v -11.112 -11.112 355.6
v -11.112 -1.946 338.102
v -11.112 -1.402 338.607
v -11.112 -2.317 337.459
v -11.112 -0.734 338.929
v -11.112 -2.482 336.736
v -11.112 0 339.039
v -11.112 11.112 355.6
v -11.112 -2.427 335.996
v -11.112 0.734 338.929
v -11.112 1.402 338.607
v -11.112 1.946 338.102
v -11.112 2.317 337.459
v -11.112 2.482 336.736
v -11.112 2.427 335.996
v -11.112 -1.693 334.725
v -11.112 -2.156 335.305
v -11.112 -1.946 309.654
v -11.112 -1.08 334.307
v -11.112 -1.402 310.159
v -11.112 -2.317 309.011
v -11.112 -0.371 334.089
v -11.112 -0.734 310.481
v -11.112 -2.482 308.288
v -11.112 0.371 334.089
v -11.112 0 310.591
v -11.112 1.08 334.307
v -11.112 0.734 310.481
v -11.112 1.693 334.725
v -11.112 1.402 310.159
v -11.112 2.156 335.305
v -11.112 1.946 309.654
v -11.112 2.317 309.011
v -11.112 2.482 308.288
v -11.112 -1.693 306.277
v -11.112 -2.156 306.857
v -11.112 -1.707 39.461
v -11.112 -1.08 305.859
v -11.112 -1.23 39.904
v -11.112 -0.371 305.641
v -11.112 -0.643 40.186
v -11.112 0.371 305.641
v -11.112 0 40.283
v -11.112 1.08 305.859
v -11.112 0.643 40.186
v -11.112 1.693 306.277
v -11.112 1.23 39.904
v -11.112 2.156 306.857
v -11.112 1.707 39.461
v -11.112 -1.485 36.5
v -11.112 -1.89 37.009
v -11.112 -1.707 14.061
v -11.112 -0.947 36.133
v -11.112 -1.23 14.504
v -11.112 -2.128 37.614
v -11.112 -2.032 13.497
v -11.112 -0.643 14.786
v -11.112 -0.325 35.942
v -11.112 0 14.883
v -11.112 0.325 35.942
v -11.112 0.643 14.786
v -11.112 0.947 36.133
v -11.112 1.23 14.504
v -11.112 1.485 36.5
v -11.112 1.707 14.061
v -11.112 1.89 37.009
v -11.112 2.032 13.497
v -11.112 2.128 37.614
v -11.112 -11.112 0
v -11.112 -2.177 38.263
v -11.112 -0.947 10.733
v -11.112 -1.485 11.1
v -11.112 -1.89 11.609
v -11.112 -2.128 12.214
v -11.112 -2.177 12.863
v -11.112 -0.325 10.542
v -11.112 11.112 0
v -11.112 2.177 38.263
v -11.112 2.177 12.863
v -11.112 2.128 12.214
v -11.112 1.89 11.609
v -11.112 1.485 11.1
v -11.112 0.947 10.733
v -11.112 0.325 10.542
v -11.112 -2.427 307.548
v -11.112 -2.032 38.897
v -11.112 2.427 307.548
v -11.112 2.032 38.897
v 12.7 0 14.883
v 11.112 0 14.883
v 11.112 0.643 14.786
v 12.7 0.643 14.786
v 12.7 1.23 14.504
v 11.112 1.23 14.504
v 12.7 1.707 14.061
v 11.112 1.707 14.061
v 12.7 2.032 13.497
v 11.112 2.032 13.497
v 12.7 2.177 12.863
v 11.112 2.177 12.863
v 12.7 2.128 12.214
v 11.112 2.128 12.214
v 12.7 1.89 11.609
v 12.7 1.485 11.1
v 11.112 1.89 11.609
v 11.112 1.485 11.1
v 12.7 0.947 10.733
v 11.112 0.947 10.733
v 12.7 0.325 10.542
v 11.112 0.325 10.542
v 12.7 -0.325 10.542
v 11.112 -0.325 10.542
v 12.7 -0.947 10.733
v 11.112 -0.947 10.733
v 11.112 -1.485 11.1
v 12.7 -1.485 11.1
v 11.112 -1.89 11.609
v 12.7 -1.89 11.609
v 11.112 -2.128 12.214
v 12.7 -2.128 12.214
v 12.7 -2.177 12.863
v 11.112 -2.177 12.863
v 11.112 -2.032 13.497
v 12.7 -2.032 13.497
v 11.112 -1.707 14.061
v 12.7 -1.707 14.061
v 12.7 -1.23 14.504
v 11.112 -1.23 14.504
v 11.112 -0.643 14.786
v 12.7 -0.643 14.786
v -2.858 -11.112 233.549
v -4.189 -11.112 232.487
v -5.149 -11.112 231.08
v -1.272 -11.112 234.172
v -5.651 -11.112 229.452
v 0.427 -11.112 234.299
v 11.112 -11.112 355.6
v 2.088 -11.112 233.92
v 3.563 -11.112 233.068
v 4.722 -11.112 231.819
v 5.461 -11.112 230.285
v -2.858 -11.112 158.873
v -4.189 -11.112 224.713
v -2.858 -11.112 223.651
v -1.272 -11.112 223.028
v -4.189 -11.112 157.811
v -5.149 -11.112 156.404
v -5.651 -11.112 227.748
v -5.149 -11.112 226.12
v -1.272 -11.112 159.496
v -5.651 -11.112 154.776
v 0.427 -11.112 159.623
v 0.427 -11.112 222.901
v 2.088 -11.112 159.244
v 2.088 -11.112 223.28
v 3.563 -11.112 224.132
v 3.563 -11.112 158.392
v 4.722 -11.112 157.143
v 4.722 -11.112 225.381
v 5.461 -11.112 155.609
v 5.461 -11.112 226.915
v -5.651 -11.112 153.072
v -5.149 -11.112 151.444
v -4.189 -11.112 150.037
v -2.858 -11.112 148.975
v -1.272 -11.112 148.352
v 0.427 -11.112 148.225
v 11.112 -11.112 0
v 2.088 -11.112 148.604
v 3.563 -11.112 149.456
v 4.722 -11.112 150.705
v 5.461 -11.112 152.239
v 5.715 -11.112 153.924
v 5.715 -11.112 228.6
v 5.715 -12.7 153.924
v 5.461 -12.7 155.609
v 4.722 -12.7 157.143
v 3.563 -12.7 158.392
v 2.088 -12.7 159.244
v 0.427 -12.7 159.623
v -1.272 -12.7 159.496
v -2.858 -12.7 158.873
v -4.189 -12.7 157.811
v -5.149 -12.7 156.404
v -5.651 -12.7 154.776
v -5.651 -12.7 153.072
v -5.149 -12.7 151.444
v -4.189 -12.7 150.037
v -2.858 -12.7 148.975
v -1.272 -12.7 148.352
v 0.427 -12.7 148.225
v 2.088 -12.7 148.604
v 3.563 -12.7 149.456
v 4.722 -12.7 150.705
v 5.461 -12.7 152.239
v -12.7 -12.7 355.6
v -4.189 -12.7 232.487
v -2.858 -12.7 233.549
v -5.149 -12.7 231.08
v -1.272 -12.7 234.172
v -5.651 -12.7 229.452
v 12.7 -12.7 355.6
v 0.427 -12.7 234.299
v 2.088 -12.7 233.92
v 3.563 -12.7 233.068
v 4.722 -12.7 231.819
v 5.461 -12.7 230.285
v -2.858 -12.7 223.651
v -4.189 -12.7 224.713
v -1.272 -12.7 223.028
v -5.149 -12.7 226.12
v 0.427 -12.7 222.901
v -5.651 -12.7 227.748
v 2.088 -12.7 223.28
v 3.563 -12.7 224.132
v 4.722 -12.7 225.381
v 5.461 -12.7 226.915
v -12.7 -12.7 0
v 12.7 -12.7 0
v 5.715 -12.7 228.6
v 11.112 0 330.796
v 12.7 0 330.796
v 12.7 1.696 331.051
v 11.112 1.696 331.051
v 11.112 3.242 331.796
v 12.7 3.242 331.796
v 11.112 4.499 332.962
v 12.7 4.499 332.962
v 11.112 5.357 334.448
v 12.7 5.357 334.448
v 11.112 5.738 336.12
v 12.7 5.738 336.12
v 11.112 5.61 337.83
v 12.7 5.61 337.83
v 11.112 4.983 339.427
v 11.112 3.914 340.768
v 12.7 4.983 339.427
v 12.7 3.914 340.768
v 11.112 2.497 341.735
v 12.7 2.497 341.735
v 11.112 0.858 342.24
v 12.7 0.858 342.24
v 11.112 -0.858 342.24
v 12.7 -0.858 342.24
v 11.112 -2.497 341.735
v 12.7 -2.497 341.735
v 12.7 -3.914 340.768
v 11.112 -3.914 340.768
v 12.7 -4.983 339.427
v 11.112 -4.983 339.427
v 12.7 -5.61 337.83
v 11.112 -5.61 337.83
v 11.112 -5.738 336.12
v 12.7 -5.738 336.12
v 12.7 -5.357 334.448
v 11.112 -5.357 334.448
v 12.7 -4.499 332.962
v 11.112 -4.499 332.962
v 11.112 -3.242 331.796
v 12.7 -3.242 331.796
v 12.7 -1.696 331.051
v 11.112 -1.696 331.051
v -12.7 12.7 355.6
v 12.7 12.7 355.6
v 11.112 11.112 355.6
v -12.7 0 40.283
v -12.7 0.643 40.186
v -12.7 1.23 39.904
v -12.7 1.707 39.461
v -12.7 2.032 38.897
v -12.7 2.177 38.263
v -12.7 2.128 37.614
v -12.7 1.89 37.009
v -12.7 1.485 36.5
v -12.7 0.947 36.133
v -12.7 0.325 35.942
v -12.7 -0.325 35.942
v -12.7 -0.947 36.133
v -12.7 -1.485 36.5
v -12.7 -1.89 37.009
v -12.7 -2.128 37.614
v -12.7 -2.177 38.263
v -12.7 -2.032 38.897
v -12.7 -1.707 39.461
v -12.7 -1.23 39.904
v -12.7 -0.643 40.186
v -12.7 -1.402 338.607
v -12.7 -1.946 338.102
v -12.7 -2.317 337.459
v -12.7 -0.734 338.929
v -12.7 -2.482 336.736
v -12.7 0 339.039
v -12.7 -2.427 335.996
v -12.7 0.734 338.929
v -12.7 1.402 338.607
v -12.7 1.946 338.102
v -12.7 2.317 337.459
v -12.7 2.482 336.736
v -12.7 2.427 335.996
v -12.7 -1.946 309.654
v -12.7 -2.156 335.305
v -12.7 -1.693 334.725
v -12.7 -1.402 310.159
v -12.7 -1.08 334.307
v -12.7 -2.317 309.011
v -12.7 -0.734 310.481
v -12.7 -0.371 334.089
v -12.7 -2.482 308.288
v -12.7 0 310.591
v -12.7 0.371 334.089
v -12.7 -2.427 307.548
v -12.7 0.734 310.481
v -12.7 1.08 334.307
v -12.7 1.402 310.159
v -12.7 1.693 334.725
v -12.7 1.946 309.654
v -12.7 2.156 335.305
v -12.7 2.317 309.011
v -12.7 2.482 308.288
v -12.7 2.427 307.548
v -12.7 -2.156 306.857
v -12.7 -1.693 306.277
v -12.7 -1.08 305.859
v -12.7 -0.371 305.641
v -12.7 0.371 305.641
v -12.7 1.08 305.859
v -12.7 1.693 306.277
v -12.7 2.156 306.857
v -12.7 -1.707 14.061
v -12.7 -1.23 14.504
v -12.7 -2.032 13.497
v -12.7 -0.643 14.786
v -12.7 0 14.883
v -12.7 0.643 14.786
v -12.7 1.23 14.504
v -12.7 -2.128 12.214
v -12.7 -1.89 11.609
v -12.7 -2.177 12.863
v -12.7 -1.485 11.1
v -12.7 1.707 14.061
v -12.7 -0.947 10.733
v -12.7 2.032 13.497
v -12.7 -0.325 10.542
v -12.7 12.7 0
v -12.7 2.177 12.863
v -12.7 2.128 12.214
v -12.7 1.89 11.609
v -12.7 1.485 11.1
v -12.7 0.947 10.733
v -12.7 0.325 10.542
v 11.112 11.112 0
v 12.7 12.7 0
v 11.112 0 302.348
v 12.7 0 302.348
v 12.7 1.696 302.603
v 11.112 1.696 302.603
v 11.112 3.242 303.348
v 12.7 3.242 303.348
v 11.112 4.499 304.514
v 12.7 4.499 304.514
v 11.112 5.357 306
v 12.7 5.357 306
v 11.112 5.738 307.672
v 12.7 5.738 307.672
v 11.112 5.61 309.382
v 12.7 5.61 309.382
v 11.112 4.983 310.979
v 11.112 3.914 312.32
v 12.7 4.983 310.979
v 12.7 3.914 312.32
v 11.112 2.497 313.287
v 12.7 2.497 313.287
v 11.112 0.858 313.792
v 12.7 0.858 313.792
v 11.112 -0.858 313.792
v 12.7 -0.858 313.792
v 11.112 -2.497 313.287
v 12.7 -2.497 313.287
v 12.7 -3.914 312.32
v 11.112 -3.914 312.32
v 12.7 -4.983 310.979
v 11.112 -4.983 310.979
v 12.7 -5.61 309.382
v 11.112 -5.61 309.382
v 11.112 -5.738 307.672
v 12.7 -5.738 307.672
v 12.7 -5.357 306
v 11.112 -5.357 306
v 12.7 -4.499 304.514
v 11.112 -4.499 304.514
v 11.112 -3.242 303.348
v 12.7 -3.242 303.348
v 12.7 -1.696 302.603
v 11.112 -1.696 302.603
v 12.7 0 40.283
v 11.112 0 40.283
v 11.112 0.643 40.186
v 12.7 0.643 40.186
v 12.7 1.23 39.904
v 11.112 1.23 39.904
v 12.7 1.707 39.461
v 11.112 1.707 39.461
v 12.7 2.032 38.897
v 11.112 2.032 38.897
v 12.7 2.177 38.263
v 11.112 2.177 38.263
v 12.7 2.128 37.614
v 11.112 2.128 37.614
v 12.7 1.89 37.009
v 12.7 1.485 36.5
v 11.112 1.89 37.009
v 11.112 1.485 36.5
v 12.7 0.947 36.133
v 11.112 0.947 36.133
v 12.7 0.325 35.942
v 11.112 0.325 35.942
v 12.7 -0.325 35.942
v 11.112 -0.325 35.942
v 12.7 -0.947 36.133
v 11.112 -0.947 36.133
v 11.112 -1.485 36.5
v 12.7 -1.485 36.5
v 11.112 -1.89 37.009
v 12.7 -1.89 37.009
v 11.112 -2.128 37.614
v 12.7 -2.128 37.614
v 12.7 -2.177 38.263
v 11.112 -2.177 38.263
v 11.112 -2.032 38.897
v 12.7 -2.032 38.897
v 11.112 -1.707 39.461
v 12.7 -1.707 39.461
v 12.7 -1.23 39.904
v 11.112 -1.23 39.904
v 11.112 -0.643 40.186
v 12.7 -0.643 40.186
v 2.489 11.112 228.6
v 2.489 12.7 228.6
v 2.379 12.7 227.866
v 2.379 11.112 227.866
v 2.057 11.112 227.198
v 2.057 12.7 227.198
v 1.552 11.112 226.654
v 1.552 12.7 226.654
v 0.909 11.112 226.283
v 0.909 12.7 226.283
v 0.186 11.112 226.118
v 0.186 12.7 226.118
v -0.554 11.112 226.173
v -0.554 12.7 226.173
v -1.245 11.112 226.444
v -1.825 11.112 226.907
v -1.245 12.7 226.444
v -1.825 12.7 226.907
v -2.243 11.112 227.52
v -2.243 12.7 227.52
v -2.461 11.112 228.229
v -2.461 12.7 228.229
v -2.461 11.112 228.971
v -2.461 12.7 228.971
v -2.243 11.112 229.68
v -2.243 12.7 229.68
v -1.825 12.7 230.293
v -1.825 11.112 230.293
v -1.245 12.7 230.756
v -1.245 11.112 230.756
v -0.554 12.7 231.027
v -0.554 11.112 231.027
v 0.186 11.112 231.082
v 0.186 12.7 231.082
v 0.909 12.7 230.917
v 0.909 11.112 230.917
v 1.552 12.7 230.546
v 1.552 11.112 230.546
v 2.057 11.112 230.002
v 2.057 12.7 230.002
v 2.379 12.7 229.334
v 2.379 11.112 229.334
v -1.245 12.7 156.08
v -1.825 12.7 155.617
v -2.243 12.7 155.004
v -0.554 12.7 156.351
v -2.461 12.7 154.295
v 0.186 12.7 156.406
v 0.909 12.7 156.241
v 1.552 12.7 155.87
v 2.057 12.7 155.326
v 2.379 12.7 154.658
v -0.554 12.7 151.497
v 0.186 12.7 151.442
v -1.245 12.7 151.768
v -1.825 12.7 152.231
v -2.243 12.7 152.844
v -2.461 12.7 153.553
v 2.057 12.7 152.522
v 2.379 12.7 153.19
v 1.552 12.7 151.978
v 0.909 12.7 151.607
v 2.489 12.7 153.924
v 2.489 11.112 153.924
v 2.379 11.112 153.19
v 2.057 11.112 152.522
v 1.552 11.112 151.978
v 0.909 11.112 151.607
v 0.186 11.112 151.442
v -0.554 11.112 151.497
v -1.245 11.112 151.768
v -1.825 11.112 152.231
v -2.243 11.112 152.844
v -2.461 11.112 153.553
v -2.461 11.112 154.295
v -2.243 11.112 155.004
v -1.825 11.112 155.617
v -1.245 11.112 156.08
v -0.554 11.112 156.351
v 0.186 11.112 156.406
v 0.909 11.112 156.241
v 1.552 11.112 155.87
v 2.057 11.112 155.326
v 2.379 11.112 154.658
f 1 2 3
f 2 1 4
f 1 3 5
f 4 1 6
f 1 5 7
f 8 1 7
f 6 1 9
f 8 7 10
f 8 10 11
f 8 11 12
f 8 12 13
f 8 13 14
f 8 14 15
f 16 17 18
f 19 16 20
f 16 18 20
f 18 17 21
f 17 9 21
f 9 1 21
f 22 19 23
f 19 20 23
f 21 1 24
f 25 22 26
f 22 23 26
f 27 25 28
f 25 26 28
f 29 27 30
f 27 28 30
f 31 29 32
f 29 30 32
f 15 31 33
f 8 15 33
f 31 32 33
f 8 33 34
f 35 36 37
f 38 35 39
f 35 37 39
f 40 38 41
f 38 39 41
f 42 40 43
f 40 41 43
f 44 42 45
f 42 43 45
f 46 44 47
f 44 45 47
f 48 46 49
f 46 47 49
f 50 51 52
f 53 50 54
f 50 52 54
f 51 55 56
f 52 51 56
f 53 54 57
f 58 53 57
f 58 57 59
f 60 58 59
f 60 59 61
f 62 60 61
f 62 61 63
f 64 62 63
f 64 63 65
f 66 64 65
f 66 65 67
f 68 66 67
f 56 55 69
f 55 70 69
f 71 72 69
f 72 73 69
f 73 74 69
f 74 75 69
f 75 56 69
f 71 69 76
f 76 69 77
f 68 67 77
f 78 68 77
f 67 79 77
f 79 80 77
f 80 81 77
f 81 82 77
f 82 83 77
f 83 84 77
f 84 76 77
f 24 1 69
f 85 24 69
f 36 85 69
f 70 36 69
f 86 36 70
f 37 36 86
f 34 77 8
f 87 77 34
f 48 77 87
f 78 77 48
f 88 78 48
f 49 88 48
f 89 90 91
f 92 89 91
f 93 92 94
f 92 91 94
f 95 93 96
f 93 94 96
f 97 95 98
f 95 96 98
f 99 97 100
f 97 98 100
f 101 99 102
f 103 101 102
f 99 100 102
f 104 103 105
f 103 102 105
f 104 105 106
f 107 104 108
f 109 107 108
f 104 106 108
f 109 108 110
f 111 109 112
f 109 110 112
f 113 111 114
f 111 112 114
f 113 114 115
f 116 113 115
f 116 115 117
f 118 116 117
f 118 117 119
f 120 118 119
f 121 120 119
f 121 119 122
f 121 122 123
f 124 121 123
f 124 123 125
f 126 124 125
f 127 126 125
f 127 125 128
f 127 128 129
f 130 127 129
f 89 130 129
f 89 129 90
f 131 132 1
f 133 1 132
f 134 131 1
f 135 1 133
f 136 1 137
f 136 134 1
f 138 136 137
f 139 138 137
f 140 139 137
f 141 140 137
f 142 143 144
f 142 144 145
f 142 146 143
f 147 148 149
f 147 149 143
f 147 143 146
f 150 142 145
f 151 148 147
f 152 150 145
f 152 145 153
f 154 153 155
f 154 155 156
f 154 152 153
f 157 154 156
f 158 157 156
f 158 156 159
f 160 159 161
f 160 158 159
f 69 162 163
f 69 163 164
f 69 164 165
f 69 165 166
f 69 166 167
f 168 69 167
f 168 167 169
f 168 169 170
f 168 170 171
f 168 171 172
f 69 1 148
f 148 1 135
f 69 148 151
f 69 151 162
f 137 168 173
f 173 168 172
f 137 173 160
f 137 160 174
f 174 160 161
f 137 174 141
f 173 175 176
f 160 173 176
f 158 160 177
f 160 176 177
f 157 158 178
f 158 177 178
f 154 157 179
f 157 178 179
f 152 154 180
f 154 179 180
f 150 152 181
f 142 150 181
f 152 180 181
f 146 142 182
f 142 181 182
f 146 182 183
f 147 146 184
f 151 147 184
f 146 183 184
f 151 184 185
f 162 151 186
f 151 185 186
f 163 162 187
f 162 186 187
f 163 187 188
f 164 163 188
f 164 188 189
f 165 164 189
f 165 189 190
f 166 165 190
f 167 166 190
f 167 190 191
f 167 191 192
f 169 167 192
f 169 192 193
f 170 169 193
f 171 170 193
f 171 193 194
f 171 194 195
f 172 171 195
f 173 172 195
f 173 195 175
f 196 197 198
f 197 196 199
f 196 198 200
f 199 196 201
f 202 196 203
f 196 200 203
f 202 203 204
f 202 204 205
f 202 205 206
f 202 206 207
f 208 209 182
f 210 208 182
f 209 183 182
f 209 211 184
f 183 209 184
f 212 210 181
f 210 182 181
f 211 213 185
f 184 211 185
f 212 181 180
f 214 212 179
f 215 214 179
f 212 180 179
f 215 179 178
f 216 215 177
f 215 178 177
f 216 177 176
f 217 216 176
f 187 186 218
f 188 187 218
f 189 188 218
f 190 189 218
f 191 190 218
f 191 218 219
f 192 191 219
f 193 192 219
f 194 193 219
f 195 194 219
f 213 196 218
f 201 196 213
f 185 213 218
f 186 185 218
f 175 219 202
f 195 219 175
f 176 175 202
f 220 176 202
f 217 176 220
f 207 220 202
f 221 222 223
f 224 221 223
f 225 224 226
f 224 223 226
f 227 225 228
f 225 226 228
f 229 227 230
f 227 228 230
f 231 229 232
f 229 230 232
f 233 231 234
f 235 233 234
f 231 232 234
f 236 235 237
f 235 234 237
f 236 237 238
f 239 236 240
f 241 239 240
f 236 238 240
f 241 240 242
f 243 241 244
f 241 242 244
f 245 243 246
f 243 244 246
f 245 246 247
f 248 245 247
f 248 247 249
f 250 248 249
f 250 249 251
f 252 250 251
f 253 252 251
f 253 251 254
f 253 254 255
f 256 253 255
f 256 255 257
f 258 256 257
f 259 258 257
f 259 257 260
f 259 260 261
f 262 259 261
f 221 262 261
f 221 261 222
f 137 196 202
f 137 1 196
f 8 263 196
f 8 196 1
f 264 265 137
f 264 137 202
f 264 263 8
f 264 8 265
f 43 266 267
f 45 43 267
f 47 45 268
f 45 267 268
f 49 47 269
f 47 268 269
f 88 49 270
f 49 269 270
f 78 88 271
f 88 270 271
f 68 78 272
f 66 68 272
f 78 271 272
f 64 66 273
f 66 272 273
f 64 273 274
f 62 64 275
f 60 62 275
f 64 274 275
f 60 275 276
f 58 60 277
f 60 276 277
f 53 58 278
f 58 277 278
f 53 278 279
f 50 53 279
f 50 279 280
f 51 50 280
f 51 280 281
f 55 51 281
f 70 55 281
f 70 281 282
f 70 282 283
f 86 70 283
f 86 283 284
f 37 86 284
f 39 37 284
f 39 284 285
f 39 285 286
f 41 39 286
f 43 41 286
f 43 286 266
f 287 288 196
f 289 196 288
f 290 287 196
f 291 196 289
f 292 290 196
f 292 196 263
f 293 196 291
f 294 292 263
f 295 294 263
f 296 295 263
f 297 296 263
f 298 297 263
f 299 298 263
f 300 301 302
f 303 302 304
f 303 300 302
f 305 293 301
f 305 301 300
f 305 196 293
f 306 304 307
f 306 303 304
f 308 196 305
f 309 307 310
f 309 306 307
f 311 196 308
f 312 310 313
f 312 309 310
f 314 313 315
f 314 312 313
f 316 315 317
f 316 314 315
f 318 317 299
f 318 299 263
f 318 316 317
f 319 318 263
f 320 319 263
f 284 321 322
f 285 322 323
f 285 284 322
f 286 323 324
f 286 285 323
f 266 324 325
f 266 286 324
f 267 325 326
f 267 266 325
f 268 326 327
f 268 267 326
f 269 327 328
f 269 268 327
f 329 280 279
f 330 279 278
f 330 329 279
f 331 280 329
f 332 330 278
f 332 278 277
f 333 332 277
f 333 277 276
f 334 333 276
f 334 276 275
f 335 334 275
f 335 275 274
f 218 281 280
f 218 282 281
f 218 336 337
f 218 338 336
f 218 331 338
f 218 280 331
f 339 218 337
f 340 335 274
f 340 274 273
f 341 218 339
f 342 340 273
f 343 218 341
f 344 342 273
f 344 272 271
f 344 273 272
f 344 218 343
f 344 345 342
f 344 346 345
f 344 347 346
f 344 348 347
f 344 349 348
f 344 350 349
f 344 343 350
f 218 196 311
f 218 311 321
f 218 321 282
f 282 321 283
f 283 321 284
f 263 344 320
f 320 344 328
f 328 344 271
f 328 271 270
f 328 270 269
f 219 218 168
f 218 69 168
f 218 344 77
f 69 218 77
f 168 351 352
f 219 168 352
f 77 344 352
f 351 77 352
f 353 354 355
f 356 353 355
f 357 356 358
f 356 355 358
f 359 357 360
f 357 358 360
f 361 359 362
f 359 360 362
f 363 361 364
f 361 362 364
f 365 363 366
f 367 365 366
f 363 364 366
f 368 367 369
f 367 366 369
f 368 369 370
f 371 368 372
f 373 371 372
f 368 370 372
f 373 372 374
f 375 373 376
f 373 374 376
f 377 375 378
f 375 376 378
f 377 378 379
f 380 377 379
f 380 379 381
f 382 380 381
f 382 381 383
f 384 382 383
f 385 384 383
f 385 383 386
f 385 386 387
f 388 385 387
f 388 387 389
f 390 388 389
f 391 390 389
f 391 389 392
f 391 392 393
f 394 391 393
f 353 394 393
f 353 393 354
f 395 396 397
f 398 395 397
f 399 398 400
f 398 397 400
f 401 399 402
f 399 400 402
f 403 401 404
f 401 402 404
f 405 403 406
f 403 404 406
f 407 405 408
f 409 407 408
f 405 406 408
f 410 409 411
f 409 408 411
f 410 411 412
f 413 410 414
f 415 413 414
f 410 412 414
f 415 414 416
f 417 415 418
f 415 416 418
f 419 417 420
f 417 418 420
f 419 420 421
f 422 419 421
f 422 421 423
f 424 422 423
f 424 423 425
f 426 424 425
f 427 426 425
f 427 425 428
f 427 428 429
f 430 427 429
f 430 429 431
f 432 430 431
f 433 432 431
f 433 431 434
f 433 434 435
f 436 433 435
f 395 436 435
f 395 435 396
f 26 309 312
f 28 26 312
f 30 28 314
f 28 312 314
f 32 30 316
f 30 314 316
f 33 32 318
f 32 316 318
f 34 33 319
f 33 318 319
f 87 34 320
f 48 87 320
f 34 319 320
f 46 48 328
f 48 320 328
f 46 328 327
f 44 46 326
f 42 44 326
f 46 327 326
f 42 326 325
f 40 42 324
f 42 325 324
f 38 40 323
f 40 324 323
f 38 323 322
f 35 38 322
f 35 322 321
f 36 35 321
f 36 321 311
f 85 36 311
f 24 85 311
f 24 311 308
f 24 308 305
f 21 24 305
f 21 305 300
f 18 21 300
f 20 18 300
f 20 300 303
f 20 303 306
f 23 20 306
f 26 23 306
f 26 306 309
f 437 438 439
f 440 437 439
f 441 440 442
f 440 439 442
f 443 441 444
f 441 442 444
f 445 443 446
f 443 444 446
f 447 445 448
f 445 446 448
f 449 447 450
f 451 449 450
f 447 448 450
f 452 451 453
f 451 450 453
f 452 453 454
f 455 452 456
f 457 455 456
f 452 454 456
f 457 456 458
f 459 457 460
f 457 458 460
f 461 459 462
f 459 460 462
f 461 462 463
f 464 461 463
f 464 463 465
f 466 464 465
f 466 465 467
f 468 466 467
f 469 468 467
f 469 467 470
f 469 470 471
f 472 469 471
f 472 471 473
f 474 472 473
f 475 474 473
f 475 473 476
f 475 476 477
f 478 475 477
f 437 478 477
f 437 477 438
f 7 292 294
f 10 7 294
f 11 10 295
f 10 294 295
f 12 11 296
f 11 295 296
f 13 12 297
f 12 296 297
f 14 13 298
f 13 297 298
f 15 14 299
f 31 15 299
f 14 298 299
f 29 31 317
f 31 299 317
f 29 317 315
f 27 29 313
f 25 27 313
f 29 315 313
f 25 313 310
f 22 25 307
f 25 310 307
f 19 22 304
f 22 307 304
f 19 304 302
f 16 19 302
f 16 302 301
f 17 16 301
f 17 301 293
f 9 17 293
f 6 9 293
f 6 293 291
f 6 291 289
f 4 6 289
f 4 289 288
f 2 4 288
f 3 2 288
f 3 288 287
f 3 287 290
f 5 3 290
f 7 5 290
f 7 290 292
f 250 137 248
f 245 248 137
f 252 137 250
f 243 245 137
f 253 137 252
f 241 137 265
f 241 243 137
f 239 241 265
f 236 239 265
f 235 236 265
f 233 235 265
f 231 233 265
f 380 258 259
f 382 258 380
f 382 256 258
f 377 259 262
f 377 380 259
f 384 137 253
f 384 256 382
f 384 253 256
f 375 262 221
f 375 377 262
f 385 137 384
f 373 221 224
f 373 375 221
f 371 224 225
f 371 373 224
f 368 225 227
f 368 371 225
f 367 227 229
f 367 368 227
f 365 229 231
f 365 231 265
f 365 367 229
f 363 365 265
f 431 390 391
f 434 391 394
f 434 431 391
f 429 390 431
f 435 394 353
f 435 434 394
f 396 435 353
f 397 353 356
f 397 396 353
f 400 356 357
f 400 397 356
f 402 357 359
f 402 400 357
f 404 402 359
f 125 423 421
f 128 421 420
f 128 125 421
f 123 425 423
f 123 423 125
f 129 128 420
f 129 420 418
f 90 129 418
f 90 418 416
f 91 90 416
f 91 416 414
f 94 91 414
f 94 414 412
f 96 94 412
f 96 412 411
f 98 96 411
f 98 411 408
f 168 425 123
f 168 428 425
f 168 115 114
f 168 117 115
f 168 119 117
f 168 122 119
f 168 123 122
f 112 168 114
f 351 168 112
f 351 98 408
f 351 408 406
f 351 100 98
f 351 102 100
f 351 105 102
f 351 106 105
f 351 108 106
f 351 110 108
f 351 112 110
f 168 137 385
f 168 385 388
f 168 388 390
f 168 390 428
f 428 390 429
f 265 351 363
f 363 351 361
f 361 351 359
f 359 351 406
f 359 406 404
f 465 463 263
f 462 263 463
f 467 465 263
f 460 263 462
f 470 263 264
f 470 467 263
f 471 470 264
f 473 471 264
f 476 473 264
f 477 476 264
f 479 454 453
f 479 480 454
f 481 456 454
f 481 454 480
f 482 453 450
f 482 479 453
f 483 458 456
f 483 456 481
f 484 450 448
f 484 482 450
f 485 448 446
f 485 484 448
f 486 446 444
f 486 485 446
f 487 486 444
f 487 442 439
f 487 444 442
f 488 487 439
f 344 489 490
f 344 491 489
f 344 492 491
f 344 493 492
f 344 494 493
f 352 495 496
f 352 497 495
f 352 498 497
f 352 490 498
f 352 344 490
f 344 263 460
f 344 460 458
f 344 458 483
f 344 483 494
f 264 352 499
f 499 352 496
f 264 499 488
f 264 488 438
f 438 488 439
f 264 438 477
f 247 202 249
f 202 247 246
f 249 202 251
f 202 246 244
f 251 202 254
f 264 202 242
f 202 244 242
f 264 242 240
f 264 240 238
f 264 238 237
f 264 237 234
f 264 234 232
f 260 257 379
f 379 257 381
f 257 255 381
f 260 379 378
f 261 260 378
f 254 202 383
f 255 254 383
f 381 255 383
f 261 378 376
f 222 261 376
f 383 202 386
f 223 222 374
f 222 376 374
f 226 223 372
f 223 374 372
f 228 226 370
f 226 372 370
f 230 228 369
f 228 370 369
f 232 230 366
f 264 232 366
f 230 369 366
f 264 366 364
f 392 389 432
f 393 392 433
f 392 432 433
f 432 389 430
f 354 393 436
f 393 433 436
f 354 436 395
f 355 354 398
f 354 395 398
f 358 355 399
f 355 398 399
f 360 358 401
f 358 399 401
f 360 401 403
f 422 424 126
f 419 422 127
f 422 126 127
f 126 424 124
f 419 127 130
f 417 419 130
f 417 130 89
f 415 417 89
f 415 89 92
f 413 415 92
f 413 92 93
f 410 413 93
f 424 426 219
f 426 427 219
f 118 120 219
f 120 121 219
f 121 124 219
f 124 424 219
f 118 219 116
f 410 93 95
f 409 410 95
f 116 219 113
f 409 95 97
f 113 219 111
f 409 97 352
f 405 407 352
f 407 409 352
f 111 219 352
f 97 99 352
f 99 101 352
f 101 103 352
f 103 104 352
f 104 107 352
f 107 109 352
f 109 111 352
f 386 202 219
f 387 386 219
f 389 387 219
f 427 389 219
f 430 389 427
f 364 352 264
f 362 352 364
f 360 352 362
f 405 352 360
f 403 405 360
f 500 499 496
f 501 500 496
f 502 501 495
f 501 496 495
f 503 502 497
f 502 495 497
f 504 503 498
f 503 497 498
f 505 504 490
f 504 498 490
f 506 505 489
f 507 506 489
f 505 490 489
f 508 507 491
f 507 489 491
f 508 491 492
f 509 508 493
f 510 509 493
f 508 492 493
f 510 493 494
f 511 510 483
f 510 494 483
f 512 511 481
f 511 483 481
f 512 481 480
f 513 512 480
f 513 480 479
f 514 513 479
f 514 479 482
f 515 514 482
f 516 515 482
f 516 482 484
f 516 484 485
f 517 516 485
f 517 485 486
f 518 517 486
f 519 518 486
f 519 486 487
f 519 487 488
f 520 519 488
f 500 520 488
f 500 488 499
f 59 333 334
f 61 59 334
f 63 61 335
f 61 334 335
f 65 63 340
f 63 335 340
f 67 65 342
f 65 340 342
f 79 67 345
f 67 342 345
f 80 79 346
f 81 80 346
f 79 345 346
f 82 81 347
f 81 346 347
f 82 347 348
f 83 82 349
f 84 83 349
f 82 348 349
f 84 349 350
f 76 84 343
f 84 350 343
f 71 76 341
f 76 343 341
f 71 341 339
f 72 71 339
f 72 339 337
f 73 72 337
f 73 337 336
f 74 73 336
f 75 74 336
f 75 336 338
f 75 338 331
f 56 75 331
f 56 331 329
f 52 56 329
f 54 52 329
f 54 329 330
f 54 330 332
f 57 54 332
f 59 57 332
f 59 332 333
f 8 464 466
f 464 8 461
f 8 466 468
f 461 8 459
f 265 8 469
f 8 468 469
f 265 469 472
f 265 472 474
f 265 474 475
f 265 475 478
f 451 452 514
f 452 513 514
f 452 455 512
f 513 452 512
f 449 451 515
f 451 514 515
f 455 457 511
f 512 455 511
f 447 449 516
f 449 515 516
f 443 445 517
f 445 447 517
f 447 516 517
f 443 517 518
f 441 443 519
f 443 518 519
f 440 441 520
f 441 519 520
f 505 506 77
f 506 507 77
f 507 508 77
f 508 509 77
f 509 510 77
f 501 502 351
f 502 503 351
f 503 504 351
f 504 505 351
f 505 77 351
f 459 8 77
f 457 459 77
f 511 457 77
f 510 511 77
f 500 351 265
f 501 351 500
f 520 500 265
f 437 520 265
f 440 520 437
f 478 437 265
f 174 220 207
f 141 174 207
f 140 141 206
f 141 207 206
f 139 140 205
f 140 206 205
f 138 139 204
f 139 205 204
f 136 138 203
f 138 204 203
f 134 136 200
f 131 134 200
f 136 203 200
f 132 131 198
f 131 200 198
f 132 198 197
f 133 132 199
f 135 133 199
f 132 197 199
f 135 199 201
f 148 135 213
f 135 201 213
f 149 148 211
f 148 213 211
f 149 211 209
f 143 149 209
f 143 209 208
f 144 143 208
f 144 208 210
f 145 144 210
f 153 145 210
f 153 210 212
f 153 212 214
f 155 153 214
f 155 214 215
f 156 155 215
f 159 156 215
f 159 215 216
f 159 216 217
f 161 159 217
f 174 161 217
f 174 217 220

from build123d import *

# Parameters (mm, degrees)
SKETCH1_W           = 25.4
SKETCH1_H           = 25.4
SKETCH1_W_2         = 22.225
SKETCH1_H_2         = 22.225
BOSS_EXTRUDE1_DEPTH = 355.6
SKETCH5_R           = 2.4892
CUT_EXTRUDE2_DEPTH  = 2.54
SKETCH6_R           = 5.715
CUT_EXTRUDE3_DEPTH  = 6.35
SKETCH7_R           = 2.4892
CUT_EXTRUDE4_DEPTH  = 2.54
SKETCH8_R           = 5.75437
CUT_EXTRUDE5_DEPTH  = 2.54
SKETCH10_R          = 2.1828125
CUT_EXTRUDE7_DEPTH  = 25.4


with BuildPart() as part:
    # Sketch1 → Boss-Extrude1 (new body)
    with BuildSketch(Plane.XY):
        Rectangle(SKETCH1_W, SKETCH1_H)
        Rectangle(SKETCH1_W_2, SKETCH1_H_2, mode=Mode.SUBTRACT)
    extrude(amount=BOSS_EXTRUDE1_DEPTH)

    # Sketch5 → Cut-Extrude2 (cut)
    with BuildSketch(Plane.ZY.offset(12.7)):
        with Locations((336.55, 0)):
            Circle(SKETCH5_R)
        with Locations((308.102, 0)):
            Circle(SKETCH5_R)
    extrude(amount=-CUT_EXTRUDE2_DEPTH, mode=Mode.SUBTRACT)

    # Sketch6 → Cut-Extrude3 (cut)
    with BuildSketch(Plane.XZ.offset(12.7)):
        with Locations((0, 228.6)):
            Circle(SKETCH6_R)
        with Locations((0, 153.924)):
            Circle(SKETCH6_R)
    extrude(amount=-CUT_EXTRUDE3_DEPTH, mode=Mode.SUBTRACT)

    # Sketch7 → Cut-Extrude4 (cut)
    with BuildSketch(Plane(origin=(0, 12.7, 0), x_dir=(1, 0, 0), z_dir=(0, 1, 0))):
        with Locations((0, -228.6)):
            Circle(SKETCH7_R)
        with Locations((0, -153.924)):
            Circle(SKETCH7_R)
    extrude(amount=-CUT_EXTRUDE4_DEPTH, mode=Mode.SUBTRACT)

    # Sketch8 → Cut-Extrude5 (cut)
    with BuildSketch(Plane(origin=(12.7, 0, 0), x_dir=(0, 0, -1), z_dir=(1, 0, 0))):
        with Locations((-336.55, 0)):
            Circle(SKETCH8_R)
        with Locations((-308.102, 0)):
            Circle(SKETCH8_R)
    extrude(amount=-CUT_EXTRUDE5_DEPTH, mode=Mode.SUBTRACT)

    # Sketch10 → Cut-Extrude7 (cut)
    with BuildSketch(Plane.ZY.offset(12.7)):
        with Locations((12.7, 0)):
            Circle(SKETCH10_R)
        with Locations((38.1, 0)):
            Circle(SKETCH10_R)
    extrude(amount=-CUT_EXTRUDE7_DEPTH, mode=Mode.SUBTRACT)


solid = part.part
